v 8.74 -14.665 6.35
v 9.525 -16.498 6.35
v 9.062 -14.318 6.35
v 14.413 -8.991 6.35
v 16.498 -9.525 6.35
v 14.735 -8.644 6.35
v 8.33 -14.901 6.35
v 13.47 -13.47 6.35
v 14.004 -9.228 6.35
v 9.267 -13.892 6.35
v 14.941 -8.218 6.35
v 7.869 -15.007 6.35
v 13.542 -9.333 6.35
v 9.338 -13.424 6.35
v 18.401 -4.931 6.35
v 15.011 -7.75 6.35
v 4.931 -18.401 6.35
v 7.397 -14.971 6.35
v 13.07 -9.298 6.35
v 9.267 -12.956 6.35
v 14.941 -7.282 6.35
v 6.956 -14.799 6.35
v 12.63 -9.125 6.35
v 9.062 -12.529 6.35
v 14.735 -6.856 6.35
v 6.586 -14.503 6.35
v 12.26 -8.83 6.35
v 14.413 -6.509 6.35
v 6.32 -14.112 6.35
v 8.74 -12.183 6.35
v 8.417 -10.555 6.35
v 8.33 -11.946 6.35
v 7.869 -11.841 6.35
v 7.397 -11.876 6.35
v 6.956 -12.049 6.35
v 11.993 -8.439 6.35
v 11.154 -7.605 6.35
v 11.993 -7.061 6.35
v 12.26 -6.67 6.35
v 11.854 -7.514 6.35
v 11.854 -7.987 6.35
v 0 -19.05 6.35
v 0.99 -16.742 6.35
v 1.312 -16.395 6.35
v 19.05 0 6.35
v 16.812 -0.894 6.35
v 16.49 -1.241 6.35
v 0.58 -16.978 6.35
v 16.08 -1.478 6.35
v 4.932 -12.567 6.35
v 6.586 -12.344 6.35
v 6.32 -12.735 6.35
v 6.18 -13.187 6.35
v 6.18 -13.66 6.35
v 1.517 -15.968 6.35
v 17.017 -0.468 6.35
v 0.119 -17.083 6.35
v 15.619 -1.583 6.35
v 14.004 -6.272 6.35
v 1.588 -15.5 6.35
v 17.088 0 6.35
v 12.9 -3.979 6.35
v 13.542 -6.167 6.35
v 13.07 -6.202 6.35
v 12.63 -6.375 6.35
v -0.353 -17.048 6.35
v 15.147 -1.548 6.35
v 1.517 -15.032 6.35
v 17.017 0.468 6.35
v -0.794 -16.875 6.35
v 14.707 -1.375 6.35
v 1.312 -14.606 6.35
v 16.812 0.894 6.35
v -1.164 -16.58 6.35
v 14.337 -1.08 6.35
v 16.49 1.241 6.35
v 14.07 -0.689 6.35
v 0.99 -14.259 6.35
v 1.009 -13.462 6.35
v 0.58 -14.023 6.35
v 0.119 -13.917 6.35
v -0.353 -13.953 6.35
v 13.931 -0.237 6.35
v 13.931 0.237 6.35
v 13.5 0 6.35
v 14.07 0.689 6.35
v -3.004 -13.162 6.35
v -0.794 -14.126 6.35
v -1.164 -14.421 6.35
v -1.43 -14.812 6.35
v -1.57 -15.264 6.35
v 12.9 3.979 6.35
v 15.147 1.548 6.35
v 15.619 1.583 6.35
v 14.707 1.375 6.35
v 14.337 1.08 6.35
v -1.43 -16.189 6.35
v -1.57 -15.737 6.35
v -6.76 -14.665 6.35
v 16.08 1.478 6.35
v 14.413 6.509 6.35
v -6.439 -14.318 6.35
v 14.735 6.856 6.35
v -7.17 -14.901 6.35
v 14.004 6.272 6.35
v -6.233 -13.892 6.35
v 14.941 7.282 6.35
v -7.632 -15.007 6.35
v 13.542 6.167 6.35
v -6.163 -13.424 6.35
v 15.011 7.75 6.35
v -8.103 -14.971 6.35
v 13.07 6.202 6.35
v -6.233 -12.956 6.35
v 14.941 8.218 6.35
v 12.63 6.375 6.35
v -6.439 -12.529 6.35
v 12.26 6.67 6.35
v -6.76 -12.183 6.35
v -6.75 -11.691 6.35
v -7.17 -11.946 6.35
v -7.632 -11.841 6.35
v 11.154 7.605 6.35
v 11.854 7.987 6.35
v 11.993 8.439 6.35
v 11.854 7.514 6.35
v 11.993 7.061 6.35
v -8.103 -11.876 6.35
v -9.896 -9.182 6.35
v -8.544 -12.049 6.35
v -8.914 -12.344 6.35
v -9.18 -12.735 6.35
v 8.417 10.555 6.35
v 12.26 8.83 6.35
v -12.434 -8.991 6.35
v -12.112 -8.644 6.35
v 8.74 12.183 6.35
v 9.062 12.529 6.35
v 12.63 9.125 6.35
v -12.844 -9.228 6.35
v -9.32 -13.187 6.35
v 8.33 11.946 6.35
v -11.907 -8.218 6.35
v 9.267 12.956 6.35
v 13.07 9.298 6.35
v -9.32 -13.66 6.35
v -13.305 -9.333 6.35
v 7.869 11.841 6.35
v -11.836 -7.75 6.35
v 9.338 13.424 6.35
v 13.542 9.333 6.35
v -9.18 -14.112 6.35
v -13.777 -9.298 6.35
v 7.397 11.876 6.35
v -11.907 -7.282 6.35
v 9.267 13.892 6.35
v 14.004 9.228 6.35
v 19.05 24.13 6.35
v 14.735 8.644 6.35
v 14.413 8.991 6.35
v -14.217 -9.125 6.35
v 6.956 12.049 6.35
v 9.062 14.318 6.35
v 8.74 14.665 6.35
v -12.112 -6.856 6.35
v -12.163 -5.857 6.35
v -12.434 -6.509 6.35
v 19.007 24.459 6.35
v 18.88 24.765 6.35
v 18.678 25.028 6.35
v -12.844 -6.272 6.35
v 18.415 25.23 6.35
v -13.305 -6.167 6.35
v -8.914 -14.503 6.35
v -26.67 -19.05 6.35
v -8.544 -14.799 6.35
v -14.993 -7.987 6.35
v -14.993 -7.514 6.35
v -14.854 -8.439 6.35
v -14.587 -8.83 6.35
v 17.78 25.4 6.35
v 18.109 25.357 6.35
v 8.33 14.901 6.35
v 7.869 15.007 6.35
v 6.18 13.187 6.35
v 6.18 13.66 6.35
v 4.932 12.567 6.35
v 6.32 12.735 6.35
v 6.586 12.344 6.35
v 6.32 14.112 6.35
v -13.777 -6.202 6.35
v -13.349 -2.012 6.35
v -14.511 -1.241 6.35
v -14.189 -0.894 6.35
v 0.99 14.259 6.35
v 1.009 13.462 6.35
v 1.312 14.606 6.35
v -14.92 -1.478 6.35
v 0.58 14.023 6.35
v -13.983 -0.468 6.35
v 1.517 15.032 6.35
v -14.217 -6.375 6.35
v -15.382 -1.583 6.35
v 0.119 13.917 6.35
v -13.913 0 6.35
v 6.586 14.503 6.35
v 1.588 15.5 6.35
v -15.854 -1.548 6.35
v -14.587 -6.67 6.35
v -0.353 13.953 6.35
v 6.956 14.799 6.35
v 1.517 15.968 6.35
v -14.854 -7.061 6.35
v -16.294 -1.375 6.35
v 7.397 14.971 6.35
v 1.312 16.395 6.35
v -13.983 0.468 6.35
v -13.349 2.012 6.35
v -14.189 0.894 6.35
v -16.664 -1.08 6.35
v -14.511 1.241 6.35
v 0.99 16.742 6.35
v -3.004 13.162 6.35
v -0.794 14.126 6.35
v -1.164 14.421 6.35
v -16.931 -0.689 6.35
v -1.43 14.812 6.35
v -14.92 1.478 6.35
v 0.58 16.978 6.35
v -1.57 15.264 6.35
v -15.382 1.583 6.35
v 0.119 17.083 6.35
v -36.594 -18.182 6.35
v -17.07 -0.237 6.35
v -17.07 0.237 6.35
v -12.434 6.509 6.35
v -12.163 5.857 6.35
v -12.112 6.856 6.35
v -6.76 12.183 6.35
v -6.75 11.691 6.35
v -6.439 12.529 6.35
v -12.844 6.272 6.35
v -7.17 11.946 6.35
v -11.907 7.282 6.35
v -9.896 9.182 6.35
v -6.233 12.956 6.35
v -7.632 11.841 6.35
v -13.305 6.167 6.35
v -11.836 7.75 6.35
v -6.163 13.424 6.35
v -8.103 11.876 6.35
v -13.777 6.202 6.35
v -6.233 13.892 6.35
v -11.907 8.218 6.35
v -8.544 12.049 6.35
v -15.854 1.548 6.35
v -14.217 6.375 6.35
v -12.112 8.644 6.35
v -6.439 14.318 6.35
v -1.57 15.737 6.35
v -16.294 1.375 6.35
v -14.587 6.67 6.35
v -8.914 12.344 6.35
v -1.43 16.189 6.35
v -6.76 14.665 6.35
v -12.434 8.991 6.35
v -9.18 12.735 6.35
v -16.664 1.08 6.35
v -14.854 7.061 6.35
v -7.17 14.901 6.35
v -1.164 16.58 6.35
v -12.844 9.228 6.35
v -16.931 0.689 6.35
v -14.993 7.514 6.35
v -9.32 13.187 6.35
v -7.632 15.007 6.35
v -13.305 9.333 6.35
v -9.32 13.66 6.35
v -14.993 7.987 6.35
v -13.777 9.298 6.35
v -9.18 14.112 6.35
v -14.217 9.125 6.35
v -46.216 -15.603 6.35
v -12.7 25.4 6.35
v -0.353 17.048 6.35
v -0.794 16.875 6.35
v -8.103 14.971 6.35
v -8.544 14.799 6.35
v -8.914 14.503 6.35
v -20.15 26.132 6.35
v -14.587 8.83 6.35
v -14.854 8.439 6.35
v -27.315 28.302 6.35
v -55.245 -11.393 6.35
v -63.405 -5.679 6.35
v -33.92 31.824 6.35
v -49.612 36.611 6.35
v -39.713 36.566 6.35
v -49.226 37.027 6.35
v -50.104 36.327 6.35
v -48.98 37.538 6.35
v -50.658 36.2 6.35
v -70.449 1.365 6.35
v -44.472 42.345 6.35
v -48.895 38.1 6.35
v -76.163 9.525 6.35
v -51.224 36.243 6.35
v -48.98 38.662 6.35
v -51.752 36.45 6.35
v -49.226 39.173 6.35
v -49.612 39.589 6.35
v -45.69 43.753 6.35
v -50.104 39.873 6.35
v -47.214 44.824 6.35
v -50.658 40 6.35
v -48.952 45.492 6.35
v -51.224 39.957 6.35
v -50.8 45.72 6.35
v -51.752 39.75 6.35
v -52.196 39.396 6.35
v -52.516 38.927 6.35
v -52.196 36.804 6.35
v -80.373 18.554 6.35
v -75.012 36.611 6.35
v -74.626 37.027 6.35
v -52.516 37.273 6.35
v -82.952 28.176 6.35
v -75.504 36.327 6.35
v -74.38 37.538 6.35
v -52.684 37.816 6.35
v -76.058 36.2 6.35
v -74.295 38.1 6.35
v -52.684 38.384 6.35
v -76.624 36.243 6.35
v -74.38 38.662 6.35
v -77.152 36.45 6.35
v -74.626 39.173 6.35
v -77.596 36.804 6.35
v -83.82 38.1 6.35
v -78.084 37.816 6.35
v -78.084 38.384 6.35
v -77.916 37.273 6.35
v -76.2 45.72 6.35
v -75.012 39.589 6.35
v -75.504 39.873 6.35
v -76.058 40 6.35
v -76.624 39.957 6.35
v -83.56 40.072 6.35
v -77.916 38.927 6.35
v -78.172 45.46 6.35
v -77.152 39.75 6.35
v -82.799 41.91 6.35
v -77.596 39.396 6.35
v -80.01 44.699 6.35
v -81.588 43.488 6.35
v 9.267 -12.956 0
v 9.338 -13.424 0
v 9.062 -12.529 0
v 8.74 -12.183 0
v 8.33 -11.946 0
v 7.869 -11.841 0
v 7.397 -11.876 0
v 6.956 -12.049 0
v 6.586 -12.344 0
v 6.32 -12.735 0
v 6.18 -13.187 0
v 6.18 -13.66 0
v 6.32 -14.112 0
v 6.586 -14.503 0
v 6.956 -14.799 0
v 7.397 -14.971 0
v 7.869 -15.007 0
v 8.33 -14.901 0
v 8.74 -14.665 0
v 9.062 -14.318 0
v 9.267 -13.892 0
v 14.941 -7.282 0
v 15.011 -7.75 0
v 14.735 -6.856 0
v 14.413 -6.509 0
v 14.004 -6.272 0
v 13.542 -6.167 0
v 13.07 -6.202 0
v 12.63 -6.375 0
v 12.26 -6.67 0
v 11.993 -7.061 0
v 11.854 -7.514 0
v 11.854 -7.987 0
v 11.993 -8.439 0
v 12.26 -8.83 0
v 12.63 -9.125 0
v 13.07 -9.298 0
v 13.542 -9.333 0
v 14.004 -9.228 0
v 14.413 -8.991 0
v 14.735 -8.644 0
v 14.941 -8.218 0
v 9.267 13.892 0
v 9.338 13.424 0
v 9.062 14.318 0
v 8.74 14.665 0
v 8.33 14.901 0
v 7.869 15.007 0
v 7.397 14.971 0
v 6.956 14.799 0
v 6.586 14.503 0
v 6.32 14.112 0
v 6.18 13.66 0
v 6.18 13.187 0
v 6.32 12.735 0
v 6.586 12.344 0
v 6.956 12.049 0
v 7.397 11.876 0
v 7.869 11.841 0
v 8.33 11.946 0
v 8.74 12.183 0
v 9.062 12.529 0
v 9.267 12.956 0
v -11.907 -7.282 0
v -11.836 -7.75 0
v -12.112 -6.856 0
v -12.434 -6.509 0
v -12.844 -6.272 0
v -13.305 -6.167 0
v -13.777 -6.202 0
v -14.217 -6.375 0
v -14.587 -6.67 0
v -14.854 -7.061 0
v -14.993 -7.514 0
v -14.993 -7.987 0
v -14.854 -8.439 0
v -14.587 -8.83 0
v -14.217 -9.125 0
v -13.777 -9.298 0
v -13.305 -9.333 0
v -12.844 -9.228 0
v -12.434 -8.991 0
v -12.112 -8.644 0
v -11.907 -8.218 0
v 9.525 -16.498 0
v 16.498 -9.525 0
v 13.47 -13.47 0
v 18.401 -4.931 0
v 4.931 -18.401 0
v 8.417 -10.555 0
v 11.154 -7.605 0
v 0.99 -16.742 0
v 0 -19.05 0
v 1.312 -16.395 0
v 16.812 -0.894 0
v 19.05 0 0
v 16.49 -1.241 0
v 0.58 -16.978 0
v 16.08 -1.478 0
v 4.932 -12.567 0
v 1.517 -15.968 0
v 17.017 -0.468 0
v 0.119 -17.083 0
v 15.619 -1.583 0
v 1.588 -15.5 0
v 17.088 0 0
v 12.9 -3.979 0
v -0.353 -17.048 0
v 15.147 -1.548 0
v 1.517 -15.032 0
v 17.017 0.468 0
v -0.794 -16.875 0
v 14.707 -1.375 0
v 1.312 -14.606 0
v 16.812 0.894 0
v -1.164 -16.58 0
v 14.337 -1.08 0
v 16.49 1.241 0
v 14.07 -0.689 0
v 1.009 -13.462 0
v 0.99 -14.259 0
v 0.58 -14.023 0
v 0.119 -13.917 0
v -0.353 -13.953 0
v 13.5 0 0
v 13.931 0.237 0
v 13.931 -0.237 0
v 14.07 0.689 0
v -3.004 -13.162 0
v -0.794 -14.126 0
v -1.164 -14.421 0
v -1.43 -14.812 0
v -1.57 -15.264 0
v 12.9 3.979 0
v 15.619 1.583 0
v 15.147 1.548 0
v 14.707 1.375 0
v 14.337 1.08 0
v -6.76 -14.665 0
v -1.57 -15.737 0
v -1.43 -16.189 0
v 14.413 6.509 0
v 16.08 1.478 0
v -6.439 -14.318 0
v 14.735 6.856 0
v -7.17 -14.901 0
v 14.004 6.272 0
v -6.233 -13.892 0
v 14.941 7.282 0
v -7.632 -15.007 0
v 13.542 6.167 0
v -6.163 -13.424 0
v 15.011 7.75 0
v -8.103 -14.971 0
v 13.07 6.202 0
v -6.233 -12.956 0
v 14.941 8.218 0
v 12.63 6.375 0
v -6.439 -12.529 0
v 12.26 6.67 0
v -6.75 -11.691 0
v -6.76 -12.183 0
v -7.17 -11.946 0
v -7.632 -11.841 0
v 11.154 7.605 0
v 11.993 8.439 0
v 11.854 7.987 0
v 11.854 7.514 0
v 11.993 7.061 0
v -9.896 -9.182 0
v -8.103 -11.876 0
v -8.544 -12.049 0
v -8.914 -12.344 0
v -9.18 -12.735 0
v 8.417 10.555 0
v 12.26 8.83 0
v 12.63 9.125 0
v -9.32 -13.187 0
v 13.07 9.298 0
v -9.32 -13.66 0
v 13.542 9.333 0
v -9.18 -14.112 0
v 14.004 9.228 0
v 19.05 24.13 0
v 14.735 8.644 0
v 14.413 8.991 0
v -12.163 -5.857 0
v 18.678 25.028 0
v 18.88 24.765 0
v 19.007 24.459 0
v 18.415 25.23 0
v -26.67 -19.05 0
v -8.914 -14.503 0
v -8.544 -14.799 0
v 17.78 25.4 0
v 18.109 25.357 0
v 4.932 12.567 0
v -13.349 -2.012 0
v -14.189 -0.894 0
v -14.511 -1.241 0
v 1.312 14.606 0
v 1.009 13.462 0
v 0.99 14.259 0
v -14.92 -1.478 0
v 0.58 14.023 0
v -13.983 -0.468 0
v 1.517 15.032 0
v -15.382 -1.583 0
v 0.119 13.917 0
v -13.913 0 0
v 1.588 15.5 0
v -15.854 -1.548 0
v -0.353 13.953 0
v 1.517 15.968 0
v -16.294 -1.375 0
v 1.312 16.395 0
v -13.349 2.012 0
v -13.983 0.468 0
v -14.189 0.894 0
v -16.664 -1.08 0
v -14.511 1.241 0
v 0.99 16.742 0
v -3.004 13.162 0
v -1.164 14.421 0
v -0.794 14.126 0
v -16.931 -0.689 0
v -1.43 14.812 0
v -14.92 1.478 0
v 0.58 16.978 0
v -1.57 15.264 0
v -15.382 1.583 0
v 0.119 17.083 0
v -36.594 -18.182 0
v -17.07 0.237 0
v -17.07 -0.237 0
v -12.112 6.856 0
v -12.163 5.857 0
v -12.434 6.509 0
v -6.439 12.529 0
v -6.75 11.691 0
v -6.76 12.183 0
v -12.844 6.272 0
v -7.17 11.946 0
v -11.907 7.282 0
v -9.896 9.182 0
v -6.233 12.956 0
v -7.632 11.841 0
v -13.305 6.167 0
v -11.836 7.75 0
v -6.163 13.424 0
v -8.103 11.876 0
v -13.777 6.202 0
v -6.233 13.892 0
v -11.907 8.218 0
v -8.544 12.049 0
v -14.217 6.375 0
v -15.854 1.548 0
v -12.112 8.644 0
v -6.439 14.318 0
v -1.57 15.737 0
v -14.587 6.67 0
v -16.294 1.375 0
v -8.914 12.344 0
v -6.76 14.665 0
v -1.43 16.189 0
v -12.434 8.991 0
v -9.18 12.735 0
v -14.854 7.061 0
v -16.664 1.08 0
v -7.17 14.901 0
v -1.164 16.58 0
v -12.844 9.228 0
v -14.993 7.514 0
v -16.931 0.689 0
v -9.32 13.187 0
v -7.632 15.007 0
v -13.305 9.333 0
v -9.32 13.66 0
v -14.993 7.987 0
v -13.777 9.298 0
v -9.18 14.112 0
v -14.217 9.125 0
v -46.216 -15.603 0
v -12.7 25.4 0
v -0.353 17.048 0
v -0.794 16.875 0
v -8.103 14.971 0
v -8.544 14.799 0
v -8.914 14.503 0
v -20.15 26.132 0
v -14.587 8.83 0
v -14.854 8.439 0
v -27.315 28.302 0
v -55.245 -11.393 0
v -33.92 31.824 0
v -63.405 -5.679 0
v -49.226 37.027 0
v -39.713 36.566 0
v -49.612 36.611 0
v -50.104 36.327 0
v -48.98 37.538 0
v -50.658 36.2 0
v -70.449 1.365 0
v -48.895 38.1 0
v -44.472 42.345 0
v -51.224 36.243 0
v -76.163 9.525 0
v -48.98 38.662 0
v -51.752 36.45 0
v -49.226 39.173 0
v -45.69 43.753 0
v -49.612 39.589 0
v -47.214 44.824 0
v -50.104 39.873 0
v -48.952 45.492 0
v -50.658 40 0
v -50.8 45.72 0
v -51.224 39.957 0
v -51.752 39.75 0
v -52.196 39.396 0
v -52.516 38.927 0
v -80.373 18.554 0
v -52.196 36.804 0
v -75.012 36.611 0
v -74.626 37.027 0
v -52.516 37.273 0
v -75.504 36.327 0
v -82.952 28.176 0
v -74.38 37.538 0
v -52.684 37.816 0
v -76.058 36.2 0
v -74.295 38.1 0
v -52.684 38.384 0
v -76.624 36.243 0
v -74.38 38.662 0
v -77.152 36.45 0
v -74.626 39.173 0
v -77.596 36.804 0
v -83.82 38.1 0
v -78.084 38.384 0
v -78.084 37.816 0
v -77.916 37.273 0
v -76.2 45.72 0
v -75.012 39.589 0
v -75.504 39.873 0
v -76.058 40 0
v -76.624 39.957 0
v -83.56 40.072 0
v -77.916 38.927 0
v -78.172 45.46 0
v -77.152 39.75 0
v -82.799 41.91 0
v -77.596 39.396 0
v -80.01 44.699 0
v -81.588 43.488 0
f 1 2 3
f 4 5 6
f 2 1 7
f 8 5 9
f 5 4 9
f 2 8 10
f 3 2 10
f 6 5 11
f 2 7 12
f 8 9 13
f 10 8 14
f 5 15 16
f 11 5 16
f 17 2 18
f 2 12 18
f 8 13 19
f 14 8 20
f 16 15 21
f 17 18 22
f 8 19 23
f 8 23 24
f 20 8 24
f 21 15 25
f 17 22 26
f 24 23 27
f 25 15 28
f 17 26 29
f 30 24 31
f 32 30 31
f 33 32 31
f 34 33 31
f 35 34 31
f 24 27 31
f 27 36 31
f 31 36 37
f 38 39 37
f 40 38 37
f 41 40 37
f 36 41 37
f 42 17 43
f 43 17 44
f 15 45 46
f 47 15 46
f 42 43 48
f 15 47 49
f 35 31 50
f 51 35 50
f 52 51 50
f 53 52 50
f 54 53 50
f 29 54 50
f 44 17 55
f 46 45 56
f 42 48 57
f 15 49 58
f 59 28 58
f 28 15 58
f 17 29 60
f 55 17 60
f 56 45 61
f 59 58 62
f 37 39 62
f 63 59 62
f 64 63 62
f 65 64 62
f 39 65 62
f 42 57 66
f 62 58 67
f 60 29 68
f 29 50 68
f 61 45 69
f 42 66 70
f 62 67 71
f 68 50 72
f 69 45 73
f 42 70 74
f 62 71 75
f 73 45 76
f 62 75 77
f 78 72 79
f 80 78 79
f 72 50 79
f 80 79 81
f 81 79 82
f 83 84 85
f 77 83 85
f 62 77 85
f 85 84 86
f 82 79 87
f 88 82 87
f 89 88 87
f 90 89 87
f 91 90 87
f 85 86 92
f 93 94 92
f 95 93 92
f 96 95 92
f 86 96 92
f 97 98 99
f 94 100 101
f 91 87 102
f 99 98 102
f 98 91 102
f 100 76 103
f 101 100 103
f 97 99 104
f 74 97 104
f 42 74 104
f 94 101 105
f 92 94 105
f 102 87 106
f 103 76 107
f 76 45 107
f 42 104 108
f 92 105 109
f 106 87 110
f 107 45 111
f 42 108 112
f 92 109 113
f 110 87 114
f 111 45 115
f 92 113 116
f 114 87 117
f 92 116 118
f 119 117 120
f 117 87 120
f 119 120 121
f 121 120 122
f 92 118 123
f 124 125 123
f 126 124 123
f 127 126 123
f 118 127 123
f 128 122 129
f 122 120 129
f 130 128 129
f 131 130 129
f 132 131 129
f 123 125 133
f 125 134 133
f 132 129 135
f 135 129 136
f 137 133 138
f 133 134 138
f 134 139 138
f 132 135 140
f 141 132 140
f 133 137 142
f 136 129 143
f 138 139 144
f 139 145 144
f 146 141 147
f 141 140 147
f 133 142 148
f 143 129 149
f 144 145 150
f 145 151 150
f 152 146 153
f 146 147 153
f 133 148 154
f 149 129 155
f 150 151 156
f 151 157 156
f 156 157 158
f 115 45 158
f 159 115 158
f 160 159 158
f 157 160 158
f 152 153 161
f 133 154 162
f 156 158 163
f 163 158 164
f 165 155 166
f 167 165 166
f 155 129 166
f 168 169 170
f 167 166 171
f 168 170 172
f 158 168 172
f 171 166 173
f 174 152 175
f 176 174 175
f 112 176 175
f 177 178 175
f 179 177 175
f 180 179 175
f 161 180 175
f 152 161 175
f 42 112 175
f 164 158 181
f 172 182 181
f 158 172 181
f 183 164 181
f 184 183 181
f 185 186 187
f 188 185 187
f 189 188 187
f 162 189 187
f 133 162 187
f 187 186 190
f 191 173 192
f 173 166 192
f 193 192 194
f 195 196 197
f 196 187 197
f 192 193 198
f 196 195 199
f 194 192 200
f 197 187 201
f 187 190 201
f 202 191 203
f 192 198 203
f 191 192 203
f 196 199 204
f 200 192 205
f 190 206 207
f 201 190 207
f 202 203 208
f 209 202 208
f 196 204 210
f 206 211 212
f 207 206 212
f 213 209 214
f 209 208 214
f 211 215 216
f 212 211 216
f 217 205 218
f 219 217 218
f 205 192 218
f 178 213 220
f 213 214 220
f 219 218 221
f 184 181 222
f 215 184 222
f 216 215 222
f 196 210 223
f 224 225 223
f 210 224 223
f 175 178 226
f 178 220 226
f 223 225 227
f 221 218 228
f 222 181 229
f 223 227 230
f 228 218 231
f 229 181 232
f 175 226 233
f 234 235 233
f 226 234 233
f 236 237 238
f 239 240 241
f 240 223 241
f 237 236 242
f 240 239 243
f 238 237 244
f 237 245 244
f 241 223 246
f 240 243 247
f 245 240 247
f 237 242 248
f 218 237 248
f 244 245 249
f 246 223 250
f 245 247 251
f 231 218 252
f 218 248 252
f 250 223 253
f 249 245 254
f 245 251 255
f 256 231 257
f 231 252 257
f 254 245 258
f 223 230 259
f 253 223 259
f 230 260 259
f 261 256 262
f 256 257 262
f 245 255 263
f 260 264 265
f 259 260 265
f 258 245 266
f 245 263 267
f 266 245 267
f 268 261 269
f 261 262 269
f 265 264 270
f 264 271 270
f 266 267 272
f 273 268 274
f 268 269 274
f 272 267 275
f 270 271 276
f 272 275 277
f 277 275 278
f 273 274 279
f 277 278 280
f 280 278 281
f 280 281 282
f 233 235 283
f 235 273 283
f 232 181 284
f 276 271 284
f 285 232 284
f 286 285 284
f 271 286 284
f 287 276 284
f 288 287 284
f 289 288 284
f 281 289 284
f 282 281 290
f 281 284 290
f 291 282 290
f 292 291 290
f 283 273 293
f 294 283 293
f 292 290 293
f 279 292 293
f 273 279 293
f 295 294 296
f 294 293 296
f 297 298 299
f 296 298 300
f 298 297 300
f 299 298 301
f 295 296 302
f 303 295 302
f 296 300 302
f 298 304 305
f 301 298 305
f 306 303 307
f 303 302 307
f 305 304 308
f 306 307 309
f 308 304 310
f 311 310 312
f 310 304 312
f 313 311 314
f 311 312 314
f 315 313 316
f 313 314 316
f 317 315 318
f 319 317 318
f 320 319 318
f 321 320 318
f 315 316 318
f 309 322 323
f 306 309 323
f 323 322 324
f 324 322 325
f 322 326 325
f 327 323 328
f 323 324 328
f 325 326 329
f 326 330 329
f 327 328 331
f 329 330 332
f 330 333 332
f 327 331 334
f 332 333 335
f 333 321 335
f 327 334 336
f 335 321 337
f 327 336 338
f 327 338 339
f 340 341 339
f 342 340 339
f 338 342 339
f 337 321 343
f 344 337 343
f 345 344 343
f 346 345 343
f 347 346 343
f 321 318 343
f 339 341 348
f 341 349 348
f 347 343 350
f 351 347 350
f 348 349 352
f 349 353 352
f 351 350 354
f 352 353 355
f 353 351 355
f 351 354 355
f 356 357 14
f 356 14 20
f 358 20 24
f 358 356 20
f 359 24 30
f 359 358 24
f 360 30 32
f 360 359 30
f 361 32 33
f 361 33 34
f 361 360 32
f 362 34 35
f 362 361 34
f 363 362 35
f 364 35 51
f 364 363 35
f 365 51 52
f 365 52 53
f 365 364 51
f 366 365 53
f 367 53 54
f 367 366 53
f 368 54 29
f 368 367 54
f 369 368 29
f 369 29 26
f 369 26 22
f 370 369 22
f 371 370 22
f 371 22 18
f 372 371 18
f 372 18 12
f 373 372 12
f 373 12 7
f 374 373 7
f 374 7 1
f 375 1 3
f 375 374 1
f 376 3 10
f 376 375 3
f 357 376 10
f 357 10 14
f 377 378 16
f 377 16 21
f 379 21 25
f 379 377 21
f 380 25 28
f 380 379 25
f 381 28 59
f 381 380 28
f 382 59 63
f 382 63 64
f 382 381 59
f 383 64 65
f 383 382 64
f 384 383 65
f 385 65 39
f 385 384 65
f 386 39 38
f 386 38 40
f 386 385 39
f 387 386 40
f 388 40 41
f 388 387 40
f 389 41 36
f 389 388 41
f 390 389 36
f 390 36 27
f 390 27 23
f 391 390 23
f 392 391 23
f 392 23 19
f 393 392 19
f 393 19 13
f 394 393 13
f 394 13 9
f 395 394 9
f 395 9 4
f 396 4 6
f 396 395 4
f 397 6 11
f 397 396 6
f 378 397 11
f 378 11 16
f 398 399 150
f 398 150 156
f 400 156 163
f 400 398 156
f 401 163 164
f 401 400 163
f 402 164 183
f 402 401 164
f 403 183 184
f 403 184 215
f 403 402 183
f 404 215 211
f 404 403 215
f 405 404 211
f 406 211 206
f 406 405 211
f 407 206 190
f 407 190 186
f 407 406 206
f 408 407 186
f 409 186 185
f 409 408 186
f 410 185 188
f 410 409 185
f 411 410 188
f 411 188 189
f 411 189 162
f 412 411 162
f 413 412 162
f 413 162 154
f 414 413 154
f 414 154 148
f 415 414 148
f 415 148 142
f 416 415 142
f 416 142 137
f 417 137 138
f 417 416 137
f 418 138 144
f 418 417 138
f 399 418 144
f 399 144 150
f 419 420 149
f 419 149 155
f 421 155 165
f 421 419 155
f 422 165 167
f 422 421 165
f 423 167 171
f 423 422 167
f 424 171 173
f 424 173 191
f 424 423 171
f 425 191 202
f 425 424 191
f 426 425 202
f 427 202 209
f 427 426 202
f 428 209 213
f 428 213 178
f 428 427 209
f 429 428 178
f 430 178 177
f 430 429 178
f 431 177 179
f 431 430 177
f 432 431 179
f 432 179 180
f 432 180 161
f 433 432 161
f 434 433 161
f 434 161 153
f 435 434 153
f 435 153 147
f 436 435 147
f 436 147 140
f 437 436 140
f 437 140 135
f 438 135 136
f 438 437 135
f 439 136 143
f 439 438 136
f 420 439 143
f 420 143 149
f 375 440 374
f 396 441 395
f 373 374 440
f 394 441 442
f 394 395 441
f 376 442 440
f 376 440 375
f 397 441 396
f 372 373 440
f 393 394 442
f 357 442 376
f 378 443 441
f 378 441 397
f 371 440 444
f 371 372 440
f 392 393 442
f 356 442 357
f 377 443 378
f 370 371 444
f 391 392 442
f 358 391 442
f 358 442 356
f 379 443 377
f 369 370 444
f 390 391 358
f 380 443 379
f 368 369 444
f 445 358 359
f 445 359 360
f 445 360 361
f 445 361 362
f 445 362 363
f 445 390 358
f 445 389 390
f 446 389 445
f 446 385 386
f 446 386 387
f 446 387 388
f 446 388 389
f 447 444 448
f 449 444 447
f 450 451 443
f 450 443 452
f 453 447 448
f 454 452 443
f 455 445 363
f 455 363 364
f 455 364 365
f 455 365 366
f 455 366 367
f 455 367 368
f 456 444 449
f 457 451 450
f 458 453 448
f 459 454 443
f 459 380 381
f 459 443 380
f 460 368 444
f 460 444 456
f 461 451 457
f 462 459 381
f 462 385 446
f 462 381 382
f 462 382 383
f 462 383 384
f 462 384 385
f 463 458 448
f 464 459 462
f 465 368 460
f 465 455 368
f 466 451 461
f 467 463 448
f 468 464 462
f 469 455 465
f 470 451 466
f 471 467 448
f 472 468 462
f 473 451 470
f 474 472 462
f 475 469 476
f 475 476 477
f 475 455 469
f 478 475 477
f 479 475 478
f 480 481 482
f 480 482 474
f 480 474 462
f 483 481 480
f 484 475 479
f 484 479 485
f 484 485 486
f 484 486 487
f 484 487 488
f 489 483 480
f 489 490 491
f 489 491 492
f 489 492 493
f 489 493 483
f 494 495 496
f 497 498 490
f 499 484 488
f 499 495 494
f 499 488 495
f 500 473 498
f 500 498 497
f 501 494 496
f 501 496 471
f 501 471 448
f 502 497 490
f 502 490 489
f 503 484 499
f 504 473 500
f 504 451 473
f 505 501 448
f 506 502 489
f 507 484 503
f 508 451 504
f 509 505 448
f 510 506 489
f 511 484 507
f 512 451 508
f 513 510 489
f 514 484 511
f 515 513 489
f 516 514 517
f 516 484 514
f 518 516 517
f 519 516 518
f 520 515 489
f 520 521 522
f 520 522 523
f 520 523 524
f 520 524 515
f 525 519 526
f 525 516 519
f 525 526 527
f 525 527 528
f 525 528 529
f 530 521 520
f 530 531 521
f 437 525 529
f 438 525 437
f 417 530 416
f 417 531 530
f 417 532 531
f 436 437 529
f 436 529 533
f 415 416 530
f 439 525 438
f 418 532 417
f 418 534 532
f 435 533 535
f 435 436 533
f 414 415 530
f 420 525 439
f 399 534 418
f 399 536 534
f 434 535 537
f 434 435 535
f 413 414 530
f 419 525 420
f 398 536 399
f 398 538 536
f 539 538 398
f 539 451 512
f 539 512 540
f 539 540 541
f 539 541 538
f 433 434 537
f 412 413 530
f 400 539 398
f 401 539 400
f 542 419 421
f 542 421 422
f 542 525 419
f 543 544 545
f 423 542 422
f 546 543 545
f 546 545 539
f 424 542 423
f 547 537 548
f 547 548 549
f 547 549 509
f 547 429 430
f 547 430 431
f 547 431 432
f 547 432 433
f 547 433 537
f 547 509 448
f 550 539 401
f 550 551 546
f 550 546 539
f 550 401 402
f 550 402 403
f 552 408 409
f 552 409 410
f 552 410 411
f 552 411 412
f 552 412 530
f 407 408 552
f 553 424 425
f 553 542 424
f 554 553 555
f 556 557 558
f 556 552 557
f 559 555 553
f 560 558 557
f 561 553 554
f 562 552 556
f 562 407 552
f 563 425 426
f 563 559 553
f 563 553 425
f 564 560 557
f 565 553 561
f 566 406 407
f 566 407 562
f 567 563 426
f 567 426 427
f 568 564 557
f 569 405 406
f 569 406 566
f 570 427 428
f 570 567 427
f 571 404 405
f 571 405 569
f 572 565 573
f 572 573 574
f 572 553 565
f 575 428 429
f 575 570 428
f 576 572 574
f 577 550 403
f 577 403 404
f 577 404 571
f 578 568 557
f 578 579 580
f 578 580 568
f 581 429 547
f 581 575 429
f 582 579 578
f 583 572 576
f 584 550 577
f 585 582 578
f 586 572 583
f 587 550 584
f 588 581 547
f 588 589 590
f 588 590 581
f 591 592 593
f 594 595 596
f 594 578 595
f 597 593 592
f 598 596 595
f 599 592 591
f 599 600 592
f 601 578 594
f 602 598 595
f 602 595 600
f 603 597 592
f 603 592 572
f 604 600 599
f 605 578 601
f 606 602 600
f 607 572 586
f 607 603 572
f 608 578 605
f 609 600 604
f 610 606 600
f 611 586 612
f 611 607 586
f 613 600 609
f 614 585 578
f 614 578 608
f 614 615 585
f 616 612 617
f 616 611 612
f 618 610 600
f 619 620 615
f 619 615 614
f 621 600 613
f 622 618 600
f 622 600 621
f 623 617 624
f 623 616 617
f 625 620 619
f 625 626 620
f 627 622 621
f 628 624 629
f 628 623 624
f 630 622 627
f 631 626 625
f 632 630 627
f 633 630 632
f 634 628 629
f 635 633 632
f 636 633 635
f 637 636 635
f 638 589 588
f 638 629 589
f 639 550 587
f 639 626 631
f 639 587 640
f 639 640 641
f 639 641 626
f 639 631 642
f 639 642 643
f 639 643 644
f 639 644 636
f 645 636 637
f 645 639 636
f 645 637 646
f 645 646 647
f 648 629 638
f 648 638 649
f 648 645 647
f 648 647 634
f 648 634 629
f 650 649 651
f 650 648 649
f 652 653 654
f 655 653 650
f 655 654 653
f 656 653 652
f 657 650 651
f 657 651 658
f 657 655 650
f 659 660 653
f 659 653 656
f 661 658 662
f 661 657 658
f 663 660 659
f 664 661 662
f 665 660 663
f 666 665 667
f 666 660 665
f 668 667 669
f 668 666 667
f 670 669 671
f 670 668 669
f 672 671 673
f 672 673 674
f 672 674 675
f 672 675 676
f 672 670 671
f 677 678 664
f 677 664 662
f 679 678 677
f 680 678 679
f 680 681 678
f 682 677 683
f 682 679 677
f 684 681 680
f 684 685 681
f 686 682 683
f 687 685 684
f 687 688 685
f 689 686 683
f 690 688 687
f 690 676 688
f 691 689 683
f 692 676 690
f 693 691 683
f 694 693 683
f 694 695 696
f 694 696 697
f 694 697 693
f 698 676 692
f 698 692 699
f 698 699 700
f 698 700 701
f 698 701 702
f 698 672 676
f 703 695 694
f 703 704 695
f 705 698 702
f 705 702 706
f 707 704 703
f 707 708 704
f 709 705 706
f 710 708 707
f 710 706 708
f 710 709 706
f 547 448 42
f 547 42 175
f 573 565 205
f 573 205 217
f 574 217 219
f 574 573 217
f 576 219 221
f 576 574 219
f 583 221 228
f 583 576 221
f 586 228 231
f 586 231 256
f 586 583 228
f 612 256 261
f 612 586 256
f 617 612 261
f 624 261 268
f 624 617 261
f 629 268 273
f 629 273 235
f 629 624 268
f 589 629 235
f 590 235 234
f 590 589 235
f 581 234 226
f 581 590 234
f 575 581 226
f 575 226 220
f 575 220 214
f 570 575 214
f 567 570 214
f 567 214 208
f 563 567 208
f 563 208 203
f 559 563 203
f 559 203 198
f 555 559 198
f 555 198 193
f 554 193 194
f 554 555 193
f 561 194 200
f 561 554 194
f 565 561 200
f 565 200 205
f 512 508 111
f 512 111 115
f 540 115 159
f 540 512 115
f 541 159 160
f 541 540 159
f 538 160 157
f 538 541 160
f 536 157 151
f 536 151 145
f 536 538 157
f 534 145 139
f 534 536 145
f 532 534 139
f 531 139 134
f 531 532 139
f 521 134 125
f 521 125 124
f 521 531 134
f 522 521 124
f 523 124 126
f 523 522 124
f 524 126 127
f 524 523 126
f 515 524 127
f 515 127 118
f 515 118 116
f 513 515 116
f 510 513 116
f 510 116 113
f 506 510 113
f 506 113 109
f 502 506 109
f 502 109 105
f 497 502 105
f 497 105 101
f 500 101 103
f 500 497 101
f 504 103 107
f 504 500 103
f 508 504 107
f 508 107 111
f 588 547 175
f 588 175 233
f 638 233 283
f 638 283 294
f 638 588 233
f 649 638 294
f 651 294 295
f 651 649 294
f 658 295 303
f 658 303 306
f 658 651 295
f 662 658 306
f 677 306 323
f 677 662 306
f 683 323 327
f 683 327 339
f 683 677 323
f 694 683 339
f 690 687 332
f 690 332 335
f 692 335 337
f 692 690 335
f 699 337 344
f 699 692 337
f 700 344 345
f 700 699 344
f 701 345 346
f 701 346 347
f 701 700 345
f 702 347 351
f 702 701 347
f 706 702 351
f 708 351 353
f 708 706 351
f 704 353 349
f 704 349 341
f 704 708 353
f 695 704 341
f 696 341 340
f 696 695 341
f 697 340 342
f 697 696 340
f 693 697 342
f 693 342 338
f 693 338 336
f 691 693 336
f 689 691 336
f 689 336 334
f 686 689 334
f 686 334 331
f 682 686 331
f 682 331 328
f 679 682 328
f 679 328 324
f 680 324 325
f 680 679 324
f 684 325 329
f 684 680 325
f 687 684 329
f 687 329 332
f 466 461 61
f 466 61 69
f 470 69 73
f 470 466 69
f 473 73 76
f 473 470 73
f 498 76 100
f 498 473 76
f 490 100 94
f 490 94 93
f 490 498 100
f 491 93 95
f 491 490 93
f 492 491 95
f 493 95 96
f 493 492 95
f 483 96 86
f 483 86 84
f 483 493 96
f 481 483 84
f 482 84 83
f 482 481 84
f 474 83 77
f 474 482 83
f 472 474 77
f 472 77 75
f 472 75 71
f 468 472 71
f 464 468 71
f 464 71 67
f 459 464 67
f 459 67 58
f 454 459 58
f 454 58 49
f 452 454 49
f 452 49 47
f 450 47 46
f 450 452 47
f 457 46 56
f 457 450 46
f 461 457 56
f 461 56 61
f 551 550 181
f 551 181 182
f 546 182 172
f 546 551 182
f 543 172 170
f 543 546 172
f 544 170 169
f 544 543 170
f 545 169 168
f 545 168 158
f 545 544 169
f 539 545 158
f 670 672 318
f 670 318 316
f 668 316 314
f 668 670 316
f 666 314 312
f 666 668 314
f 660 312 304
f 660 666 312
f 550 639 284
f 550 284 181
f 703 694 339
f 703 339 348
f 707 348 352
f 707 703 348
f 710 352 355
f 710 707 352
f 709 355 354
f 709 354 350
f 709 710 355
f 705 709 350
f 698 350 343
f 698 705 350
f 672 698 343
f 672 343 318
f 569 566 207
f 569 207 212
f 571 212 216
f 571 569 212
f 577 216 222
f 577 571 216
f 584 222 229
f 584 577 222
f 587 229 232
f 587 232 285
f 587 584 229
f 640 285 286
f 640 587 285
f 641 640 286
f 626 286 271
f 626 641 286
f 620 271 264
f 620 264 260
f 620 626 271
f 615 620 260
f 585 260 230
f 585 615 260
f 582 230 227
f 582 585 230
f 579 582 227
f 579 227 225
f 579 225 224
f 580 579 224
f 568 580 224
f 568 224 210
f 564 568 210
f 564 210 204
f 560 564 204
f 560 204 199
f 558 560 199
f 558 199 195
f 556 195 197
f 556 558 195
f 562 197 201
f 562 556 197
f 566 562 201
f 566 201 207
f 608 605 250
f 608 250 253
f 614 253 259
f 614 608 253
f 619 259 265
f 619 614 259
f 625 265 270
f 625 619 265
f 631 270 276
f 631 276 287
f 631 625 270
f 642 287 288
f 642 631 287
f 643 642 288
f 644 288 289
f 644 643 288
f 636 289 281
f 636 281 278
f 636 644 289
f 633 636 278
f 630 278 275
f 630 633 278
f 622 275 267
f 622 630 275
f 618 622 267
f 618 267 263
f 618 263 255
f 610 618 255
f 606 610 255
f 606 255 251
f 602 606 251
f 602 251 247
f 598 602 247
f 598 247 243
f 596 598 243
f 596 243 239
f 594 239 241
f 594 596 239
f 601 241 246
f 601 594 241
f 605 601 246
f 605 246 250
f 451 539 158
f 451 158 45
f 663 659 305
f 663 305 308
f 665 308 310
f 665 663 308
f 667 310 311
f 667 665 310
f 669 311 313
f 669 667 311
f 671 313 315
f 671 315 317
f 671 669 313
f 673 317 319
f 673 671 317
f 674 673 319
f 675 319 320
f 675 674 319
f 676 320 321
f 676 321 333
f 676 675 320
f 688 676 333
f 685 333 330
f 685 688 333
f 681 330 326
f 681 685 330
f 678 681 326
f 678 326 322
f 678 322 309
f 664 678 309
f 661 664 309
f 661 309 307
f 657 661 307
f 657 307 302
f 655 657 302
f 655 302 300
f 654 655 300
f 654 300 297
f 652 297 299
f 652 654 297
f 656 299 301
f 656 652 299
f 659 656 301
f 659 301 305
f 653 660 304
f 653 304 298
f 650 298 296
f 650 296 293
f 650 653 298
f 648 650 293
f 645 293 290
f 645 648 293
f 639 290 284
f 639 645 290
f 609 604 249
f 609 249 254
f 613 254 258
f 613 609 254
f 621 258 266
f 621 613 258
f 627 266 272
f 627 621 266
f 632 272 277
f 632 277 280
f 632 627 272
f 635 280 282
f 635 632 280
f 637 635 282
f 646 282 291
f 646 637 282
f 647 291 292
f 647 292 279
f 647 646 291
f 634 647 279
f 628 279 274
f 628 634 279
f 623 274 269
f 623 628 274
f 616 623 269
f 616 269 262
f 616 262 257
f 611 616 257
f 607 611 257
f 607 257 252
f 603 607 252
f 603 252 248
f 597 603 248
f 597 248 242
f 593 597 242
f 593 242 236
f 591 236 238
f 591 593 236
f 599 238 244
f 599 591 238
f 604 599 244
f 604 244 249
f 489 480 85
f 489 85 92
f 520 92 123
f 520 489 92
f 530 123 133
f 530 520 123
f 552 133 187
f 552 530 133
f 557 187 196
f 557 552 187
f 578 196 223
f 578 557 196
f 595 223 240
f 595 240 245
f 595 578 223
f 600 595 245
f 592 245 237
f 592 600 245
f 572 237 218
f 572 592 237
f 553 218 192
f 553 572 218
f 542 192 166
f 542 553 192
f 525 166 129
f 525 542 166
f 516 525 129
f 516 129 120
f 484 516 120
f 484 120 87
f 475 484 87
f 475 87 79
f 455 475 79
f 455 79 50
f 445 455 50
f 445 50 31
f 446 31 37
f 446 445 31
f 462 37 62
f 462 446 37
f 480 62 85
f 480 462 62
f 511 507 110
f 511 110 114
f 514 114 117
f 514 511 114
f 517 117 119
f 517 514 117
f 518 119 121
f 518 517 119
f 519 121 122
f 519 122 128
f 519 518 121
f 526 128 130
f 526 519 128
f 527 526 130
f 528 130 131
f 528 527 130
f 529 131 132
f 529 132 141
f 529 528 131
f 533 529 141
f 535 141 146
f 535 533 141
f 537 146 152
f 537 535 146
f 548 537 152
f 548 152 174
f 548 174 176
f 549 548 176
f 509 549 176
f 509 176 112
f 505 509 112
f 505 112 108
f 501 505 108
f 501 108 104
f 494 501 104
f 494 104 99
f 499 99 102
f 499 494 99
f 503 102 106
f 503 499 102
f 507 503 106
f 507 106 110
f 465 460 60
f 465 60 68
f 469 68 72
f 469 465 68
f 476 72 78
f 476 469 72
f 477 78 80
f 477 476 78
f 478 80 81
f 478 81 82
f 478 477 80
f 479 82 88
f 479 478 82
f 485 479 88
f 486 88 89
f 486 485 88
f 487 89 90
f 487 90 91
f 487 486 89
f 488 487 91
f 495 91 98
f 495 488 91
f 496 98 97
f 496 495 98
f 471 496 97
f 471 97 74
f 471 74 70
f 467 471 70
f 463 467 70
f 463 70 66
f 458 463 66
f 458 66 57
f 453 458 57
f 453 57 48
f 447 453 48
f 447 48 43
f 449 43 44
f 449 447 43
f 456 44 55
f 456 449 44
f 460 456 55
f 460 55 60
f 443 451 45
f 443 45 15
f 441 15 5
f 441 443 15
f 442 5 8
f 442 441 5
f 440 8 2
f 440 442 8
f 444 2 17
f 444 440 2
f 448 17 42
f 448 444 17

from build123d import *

# Parameters (mm, degrees)
SKETCH1_R           = 1.5875
SKETCH1_R_2         = 13.5001
SKETCH1_R_3         = 1.905
BOSS_EXTRUDE1_DEPTH = 6.35


with BuildPart() as part:
    # Sketch1 → Boss-Extrude1 (new body)
    with BuildSketch(Plane.XY):
        with BuildLine():
            Line((17.78, 25.4), (-12.7, 25.4))
            ThreePointArc((-12.7, 25.4), (-30.704117647, 29.901029412), (-44.471972318, 42.345051903))
            ThreePointArc((-44.471972318, 42.345051903), (-47.214117647, 44.823529412), (-50.8, 45.72))
            Line((-50.8, 45.72), (-76.2, 45.72))
            ThreePointArc((-76.2, 45.72), (-81.588153673, 43.488153673), (-83.82, 38.1))
            ThreePointArc((-83.82, 38.1), (-67.081152545, -2.311152545), (-26.67, -19.05))
            Line((-26.67, -19.05), (0, -19.05))
            ThreePointArc((0, -19.05), (13.470384182, -13.470384182), (19.05, 0))
            Line((19.05, 0), (19.05, 24.13))
            ThreePointArc((19.05, 24.13), (18.678025612, 25.028025612), (17.78, 25.4))
        make_face()
        with Locations((-7.750175, -13.423696868)):
            Circle(SKETCH1_R, mode=Mode.SUBTRACT)
        with Locations((-13.423696868, -7.750175)):
            Circle(SKETCH1_R, mode=Mode.SUBTRACT)
        with Locations((0, -15.50035)):
            Circle(SKETCH1_R, mode=Mode.SUBTRACT)
        with Locations((7.750175, -13.423696868)):
            Circle(SKETCH1_R, mode=Mode.SUBTRACT)
        with Locations((13.423696868, -7.750175)):
            Circle(SKETCH1_R, mode=Mode.SUBTRACT)
        with Locations((-15.50035, 0)):
            Circle(SKETCH1_R, mode=Mode.SUBTRACT)
        with Locations((-13.423696868, 7.750175)):
            Circle(SKETCH1_R, mode=Mode.SUBTRACT)
        Circle(SKETCH1_R_2, mode=Mode.SUBTRACT)
        with Locations((15.50035, 0)):
            Circle(SKETCH1_R, mode=Mode.SUBTRACT)
        with Locations((13.423696868, 7.750175)):
            Circle(SKETCH1_R, mode=Mode.SUBTRACT)
        with Locations((-76.2, 38.1)):
            Circle(SKETCH1_R_3, mode=Mode.SUBTRACT)
        with Locations((-50.8, 38.1)):
            Circle(SKETCH1_R_3, mode=Mode.SUBTRACT)
        with Locations((-7.750175, 13.423696868)):
            Circle(SKETCH1_R, mode=Mode.SUBTRACT)
        with Locations((0, 15.50035)):
            Circle(SKETCH1_R, mode=Mode.SUBTRACT)
        with Locations((7.750175, 13.423696868)):
            Circle(SKETCH1_R, mode=Mode.SUBTRACT)
    extrude(amount=BOSS_EXTRUDE1_DEPTH)


solid = part.part
